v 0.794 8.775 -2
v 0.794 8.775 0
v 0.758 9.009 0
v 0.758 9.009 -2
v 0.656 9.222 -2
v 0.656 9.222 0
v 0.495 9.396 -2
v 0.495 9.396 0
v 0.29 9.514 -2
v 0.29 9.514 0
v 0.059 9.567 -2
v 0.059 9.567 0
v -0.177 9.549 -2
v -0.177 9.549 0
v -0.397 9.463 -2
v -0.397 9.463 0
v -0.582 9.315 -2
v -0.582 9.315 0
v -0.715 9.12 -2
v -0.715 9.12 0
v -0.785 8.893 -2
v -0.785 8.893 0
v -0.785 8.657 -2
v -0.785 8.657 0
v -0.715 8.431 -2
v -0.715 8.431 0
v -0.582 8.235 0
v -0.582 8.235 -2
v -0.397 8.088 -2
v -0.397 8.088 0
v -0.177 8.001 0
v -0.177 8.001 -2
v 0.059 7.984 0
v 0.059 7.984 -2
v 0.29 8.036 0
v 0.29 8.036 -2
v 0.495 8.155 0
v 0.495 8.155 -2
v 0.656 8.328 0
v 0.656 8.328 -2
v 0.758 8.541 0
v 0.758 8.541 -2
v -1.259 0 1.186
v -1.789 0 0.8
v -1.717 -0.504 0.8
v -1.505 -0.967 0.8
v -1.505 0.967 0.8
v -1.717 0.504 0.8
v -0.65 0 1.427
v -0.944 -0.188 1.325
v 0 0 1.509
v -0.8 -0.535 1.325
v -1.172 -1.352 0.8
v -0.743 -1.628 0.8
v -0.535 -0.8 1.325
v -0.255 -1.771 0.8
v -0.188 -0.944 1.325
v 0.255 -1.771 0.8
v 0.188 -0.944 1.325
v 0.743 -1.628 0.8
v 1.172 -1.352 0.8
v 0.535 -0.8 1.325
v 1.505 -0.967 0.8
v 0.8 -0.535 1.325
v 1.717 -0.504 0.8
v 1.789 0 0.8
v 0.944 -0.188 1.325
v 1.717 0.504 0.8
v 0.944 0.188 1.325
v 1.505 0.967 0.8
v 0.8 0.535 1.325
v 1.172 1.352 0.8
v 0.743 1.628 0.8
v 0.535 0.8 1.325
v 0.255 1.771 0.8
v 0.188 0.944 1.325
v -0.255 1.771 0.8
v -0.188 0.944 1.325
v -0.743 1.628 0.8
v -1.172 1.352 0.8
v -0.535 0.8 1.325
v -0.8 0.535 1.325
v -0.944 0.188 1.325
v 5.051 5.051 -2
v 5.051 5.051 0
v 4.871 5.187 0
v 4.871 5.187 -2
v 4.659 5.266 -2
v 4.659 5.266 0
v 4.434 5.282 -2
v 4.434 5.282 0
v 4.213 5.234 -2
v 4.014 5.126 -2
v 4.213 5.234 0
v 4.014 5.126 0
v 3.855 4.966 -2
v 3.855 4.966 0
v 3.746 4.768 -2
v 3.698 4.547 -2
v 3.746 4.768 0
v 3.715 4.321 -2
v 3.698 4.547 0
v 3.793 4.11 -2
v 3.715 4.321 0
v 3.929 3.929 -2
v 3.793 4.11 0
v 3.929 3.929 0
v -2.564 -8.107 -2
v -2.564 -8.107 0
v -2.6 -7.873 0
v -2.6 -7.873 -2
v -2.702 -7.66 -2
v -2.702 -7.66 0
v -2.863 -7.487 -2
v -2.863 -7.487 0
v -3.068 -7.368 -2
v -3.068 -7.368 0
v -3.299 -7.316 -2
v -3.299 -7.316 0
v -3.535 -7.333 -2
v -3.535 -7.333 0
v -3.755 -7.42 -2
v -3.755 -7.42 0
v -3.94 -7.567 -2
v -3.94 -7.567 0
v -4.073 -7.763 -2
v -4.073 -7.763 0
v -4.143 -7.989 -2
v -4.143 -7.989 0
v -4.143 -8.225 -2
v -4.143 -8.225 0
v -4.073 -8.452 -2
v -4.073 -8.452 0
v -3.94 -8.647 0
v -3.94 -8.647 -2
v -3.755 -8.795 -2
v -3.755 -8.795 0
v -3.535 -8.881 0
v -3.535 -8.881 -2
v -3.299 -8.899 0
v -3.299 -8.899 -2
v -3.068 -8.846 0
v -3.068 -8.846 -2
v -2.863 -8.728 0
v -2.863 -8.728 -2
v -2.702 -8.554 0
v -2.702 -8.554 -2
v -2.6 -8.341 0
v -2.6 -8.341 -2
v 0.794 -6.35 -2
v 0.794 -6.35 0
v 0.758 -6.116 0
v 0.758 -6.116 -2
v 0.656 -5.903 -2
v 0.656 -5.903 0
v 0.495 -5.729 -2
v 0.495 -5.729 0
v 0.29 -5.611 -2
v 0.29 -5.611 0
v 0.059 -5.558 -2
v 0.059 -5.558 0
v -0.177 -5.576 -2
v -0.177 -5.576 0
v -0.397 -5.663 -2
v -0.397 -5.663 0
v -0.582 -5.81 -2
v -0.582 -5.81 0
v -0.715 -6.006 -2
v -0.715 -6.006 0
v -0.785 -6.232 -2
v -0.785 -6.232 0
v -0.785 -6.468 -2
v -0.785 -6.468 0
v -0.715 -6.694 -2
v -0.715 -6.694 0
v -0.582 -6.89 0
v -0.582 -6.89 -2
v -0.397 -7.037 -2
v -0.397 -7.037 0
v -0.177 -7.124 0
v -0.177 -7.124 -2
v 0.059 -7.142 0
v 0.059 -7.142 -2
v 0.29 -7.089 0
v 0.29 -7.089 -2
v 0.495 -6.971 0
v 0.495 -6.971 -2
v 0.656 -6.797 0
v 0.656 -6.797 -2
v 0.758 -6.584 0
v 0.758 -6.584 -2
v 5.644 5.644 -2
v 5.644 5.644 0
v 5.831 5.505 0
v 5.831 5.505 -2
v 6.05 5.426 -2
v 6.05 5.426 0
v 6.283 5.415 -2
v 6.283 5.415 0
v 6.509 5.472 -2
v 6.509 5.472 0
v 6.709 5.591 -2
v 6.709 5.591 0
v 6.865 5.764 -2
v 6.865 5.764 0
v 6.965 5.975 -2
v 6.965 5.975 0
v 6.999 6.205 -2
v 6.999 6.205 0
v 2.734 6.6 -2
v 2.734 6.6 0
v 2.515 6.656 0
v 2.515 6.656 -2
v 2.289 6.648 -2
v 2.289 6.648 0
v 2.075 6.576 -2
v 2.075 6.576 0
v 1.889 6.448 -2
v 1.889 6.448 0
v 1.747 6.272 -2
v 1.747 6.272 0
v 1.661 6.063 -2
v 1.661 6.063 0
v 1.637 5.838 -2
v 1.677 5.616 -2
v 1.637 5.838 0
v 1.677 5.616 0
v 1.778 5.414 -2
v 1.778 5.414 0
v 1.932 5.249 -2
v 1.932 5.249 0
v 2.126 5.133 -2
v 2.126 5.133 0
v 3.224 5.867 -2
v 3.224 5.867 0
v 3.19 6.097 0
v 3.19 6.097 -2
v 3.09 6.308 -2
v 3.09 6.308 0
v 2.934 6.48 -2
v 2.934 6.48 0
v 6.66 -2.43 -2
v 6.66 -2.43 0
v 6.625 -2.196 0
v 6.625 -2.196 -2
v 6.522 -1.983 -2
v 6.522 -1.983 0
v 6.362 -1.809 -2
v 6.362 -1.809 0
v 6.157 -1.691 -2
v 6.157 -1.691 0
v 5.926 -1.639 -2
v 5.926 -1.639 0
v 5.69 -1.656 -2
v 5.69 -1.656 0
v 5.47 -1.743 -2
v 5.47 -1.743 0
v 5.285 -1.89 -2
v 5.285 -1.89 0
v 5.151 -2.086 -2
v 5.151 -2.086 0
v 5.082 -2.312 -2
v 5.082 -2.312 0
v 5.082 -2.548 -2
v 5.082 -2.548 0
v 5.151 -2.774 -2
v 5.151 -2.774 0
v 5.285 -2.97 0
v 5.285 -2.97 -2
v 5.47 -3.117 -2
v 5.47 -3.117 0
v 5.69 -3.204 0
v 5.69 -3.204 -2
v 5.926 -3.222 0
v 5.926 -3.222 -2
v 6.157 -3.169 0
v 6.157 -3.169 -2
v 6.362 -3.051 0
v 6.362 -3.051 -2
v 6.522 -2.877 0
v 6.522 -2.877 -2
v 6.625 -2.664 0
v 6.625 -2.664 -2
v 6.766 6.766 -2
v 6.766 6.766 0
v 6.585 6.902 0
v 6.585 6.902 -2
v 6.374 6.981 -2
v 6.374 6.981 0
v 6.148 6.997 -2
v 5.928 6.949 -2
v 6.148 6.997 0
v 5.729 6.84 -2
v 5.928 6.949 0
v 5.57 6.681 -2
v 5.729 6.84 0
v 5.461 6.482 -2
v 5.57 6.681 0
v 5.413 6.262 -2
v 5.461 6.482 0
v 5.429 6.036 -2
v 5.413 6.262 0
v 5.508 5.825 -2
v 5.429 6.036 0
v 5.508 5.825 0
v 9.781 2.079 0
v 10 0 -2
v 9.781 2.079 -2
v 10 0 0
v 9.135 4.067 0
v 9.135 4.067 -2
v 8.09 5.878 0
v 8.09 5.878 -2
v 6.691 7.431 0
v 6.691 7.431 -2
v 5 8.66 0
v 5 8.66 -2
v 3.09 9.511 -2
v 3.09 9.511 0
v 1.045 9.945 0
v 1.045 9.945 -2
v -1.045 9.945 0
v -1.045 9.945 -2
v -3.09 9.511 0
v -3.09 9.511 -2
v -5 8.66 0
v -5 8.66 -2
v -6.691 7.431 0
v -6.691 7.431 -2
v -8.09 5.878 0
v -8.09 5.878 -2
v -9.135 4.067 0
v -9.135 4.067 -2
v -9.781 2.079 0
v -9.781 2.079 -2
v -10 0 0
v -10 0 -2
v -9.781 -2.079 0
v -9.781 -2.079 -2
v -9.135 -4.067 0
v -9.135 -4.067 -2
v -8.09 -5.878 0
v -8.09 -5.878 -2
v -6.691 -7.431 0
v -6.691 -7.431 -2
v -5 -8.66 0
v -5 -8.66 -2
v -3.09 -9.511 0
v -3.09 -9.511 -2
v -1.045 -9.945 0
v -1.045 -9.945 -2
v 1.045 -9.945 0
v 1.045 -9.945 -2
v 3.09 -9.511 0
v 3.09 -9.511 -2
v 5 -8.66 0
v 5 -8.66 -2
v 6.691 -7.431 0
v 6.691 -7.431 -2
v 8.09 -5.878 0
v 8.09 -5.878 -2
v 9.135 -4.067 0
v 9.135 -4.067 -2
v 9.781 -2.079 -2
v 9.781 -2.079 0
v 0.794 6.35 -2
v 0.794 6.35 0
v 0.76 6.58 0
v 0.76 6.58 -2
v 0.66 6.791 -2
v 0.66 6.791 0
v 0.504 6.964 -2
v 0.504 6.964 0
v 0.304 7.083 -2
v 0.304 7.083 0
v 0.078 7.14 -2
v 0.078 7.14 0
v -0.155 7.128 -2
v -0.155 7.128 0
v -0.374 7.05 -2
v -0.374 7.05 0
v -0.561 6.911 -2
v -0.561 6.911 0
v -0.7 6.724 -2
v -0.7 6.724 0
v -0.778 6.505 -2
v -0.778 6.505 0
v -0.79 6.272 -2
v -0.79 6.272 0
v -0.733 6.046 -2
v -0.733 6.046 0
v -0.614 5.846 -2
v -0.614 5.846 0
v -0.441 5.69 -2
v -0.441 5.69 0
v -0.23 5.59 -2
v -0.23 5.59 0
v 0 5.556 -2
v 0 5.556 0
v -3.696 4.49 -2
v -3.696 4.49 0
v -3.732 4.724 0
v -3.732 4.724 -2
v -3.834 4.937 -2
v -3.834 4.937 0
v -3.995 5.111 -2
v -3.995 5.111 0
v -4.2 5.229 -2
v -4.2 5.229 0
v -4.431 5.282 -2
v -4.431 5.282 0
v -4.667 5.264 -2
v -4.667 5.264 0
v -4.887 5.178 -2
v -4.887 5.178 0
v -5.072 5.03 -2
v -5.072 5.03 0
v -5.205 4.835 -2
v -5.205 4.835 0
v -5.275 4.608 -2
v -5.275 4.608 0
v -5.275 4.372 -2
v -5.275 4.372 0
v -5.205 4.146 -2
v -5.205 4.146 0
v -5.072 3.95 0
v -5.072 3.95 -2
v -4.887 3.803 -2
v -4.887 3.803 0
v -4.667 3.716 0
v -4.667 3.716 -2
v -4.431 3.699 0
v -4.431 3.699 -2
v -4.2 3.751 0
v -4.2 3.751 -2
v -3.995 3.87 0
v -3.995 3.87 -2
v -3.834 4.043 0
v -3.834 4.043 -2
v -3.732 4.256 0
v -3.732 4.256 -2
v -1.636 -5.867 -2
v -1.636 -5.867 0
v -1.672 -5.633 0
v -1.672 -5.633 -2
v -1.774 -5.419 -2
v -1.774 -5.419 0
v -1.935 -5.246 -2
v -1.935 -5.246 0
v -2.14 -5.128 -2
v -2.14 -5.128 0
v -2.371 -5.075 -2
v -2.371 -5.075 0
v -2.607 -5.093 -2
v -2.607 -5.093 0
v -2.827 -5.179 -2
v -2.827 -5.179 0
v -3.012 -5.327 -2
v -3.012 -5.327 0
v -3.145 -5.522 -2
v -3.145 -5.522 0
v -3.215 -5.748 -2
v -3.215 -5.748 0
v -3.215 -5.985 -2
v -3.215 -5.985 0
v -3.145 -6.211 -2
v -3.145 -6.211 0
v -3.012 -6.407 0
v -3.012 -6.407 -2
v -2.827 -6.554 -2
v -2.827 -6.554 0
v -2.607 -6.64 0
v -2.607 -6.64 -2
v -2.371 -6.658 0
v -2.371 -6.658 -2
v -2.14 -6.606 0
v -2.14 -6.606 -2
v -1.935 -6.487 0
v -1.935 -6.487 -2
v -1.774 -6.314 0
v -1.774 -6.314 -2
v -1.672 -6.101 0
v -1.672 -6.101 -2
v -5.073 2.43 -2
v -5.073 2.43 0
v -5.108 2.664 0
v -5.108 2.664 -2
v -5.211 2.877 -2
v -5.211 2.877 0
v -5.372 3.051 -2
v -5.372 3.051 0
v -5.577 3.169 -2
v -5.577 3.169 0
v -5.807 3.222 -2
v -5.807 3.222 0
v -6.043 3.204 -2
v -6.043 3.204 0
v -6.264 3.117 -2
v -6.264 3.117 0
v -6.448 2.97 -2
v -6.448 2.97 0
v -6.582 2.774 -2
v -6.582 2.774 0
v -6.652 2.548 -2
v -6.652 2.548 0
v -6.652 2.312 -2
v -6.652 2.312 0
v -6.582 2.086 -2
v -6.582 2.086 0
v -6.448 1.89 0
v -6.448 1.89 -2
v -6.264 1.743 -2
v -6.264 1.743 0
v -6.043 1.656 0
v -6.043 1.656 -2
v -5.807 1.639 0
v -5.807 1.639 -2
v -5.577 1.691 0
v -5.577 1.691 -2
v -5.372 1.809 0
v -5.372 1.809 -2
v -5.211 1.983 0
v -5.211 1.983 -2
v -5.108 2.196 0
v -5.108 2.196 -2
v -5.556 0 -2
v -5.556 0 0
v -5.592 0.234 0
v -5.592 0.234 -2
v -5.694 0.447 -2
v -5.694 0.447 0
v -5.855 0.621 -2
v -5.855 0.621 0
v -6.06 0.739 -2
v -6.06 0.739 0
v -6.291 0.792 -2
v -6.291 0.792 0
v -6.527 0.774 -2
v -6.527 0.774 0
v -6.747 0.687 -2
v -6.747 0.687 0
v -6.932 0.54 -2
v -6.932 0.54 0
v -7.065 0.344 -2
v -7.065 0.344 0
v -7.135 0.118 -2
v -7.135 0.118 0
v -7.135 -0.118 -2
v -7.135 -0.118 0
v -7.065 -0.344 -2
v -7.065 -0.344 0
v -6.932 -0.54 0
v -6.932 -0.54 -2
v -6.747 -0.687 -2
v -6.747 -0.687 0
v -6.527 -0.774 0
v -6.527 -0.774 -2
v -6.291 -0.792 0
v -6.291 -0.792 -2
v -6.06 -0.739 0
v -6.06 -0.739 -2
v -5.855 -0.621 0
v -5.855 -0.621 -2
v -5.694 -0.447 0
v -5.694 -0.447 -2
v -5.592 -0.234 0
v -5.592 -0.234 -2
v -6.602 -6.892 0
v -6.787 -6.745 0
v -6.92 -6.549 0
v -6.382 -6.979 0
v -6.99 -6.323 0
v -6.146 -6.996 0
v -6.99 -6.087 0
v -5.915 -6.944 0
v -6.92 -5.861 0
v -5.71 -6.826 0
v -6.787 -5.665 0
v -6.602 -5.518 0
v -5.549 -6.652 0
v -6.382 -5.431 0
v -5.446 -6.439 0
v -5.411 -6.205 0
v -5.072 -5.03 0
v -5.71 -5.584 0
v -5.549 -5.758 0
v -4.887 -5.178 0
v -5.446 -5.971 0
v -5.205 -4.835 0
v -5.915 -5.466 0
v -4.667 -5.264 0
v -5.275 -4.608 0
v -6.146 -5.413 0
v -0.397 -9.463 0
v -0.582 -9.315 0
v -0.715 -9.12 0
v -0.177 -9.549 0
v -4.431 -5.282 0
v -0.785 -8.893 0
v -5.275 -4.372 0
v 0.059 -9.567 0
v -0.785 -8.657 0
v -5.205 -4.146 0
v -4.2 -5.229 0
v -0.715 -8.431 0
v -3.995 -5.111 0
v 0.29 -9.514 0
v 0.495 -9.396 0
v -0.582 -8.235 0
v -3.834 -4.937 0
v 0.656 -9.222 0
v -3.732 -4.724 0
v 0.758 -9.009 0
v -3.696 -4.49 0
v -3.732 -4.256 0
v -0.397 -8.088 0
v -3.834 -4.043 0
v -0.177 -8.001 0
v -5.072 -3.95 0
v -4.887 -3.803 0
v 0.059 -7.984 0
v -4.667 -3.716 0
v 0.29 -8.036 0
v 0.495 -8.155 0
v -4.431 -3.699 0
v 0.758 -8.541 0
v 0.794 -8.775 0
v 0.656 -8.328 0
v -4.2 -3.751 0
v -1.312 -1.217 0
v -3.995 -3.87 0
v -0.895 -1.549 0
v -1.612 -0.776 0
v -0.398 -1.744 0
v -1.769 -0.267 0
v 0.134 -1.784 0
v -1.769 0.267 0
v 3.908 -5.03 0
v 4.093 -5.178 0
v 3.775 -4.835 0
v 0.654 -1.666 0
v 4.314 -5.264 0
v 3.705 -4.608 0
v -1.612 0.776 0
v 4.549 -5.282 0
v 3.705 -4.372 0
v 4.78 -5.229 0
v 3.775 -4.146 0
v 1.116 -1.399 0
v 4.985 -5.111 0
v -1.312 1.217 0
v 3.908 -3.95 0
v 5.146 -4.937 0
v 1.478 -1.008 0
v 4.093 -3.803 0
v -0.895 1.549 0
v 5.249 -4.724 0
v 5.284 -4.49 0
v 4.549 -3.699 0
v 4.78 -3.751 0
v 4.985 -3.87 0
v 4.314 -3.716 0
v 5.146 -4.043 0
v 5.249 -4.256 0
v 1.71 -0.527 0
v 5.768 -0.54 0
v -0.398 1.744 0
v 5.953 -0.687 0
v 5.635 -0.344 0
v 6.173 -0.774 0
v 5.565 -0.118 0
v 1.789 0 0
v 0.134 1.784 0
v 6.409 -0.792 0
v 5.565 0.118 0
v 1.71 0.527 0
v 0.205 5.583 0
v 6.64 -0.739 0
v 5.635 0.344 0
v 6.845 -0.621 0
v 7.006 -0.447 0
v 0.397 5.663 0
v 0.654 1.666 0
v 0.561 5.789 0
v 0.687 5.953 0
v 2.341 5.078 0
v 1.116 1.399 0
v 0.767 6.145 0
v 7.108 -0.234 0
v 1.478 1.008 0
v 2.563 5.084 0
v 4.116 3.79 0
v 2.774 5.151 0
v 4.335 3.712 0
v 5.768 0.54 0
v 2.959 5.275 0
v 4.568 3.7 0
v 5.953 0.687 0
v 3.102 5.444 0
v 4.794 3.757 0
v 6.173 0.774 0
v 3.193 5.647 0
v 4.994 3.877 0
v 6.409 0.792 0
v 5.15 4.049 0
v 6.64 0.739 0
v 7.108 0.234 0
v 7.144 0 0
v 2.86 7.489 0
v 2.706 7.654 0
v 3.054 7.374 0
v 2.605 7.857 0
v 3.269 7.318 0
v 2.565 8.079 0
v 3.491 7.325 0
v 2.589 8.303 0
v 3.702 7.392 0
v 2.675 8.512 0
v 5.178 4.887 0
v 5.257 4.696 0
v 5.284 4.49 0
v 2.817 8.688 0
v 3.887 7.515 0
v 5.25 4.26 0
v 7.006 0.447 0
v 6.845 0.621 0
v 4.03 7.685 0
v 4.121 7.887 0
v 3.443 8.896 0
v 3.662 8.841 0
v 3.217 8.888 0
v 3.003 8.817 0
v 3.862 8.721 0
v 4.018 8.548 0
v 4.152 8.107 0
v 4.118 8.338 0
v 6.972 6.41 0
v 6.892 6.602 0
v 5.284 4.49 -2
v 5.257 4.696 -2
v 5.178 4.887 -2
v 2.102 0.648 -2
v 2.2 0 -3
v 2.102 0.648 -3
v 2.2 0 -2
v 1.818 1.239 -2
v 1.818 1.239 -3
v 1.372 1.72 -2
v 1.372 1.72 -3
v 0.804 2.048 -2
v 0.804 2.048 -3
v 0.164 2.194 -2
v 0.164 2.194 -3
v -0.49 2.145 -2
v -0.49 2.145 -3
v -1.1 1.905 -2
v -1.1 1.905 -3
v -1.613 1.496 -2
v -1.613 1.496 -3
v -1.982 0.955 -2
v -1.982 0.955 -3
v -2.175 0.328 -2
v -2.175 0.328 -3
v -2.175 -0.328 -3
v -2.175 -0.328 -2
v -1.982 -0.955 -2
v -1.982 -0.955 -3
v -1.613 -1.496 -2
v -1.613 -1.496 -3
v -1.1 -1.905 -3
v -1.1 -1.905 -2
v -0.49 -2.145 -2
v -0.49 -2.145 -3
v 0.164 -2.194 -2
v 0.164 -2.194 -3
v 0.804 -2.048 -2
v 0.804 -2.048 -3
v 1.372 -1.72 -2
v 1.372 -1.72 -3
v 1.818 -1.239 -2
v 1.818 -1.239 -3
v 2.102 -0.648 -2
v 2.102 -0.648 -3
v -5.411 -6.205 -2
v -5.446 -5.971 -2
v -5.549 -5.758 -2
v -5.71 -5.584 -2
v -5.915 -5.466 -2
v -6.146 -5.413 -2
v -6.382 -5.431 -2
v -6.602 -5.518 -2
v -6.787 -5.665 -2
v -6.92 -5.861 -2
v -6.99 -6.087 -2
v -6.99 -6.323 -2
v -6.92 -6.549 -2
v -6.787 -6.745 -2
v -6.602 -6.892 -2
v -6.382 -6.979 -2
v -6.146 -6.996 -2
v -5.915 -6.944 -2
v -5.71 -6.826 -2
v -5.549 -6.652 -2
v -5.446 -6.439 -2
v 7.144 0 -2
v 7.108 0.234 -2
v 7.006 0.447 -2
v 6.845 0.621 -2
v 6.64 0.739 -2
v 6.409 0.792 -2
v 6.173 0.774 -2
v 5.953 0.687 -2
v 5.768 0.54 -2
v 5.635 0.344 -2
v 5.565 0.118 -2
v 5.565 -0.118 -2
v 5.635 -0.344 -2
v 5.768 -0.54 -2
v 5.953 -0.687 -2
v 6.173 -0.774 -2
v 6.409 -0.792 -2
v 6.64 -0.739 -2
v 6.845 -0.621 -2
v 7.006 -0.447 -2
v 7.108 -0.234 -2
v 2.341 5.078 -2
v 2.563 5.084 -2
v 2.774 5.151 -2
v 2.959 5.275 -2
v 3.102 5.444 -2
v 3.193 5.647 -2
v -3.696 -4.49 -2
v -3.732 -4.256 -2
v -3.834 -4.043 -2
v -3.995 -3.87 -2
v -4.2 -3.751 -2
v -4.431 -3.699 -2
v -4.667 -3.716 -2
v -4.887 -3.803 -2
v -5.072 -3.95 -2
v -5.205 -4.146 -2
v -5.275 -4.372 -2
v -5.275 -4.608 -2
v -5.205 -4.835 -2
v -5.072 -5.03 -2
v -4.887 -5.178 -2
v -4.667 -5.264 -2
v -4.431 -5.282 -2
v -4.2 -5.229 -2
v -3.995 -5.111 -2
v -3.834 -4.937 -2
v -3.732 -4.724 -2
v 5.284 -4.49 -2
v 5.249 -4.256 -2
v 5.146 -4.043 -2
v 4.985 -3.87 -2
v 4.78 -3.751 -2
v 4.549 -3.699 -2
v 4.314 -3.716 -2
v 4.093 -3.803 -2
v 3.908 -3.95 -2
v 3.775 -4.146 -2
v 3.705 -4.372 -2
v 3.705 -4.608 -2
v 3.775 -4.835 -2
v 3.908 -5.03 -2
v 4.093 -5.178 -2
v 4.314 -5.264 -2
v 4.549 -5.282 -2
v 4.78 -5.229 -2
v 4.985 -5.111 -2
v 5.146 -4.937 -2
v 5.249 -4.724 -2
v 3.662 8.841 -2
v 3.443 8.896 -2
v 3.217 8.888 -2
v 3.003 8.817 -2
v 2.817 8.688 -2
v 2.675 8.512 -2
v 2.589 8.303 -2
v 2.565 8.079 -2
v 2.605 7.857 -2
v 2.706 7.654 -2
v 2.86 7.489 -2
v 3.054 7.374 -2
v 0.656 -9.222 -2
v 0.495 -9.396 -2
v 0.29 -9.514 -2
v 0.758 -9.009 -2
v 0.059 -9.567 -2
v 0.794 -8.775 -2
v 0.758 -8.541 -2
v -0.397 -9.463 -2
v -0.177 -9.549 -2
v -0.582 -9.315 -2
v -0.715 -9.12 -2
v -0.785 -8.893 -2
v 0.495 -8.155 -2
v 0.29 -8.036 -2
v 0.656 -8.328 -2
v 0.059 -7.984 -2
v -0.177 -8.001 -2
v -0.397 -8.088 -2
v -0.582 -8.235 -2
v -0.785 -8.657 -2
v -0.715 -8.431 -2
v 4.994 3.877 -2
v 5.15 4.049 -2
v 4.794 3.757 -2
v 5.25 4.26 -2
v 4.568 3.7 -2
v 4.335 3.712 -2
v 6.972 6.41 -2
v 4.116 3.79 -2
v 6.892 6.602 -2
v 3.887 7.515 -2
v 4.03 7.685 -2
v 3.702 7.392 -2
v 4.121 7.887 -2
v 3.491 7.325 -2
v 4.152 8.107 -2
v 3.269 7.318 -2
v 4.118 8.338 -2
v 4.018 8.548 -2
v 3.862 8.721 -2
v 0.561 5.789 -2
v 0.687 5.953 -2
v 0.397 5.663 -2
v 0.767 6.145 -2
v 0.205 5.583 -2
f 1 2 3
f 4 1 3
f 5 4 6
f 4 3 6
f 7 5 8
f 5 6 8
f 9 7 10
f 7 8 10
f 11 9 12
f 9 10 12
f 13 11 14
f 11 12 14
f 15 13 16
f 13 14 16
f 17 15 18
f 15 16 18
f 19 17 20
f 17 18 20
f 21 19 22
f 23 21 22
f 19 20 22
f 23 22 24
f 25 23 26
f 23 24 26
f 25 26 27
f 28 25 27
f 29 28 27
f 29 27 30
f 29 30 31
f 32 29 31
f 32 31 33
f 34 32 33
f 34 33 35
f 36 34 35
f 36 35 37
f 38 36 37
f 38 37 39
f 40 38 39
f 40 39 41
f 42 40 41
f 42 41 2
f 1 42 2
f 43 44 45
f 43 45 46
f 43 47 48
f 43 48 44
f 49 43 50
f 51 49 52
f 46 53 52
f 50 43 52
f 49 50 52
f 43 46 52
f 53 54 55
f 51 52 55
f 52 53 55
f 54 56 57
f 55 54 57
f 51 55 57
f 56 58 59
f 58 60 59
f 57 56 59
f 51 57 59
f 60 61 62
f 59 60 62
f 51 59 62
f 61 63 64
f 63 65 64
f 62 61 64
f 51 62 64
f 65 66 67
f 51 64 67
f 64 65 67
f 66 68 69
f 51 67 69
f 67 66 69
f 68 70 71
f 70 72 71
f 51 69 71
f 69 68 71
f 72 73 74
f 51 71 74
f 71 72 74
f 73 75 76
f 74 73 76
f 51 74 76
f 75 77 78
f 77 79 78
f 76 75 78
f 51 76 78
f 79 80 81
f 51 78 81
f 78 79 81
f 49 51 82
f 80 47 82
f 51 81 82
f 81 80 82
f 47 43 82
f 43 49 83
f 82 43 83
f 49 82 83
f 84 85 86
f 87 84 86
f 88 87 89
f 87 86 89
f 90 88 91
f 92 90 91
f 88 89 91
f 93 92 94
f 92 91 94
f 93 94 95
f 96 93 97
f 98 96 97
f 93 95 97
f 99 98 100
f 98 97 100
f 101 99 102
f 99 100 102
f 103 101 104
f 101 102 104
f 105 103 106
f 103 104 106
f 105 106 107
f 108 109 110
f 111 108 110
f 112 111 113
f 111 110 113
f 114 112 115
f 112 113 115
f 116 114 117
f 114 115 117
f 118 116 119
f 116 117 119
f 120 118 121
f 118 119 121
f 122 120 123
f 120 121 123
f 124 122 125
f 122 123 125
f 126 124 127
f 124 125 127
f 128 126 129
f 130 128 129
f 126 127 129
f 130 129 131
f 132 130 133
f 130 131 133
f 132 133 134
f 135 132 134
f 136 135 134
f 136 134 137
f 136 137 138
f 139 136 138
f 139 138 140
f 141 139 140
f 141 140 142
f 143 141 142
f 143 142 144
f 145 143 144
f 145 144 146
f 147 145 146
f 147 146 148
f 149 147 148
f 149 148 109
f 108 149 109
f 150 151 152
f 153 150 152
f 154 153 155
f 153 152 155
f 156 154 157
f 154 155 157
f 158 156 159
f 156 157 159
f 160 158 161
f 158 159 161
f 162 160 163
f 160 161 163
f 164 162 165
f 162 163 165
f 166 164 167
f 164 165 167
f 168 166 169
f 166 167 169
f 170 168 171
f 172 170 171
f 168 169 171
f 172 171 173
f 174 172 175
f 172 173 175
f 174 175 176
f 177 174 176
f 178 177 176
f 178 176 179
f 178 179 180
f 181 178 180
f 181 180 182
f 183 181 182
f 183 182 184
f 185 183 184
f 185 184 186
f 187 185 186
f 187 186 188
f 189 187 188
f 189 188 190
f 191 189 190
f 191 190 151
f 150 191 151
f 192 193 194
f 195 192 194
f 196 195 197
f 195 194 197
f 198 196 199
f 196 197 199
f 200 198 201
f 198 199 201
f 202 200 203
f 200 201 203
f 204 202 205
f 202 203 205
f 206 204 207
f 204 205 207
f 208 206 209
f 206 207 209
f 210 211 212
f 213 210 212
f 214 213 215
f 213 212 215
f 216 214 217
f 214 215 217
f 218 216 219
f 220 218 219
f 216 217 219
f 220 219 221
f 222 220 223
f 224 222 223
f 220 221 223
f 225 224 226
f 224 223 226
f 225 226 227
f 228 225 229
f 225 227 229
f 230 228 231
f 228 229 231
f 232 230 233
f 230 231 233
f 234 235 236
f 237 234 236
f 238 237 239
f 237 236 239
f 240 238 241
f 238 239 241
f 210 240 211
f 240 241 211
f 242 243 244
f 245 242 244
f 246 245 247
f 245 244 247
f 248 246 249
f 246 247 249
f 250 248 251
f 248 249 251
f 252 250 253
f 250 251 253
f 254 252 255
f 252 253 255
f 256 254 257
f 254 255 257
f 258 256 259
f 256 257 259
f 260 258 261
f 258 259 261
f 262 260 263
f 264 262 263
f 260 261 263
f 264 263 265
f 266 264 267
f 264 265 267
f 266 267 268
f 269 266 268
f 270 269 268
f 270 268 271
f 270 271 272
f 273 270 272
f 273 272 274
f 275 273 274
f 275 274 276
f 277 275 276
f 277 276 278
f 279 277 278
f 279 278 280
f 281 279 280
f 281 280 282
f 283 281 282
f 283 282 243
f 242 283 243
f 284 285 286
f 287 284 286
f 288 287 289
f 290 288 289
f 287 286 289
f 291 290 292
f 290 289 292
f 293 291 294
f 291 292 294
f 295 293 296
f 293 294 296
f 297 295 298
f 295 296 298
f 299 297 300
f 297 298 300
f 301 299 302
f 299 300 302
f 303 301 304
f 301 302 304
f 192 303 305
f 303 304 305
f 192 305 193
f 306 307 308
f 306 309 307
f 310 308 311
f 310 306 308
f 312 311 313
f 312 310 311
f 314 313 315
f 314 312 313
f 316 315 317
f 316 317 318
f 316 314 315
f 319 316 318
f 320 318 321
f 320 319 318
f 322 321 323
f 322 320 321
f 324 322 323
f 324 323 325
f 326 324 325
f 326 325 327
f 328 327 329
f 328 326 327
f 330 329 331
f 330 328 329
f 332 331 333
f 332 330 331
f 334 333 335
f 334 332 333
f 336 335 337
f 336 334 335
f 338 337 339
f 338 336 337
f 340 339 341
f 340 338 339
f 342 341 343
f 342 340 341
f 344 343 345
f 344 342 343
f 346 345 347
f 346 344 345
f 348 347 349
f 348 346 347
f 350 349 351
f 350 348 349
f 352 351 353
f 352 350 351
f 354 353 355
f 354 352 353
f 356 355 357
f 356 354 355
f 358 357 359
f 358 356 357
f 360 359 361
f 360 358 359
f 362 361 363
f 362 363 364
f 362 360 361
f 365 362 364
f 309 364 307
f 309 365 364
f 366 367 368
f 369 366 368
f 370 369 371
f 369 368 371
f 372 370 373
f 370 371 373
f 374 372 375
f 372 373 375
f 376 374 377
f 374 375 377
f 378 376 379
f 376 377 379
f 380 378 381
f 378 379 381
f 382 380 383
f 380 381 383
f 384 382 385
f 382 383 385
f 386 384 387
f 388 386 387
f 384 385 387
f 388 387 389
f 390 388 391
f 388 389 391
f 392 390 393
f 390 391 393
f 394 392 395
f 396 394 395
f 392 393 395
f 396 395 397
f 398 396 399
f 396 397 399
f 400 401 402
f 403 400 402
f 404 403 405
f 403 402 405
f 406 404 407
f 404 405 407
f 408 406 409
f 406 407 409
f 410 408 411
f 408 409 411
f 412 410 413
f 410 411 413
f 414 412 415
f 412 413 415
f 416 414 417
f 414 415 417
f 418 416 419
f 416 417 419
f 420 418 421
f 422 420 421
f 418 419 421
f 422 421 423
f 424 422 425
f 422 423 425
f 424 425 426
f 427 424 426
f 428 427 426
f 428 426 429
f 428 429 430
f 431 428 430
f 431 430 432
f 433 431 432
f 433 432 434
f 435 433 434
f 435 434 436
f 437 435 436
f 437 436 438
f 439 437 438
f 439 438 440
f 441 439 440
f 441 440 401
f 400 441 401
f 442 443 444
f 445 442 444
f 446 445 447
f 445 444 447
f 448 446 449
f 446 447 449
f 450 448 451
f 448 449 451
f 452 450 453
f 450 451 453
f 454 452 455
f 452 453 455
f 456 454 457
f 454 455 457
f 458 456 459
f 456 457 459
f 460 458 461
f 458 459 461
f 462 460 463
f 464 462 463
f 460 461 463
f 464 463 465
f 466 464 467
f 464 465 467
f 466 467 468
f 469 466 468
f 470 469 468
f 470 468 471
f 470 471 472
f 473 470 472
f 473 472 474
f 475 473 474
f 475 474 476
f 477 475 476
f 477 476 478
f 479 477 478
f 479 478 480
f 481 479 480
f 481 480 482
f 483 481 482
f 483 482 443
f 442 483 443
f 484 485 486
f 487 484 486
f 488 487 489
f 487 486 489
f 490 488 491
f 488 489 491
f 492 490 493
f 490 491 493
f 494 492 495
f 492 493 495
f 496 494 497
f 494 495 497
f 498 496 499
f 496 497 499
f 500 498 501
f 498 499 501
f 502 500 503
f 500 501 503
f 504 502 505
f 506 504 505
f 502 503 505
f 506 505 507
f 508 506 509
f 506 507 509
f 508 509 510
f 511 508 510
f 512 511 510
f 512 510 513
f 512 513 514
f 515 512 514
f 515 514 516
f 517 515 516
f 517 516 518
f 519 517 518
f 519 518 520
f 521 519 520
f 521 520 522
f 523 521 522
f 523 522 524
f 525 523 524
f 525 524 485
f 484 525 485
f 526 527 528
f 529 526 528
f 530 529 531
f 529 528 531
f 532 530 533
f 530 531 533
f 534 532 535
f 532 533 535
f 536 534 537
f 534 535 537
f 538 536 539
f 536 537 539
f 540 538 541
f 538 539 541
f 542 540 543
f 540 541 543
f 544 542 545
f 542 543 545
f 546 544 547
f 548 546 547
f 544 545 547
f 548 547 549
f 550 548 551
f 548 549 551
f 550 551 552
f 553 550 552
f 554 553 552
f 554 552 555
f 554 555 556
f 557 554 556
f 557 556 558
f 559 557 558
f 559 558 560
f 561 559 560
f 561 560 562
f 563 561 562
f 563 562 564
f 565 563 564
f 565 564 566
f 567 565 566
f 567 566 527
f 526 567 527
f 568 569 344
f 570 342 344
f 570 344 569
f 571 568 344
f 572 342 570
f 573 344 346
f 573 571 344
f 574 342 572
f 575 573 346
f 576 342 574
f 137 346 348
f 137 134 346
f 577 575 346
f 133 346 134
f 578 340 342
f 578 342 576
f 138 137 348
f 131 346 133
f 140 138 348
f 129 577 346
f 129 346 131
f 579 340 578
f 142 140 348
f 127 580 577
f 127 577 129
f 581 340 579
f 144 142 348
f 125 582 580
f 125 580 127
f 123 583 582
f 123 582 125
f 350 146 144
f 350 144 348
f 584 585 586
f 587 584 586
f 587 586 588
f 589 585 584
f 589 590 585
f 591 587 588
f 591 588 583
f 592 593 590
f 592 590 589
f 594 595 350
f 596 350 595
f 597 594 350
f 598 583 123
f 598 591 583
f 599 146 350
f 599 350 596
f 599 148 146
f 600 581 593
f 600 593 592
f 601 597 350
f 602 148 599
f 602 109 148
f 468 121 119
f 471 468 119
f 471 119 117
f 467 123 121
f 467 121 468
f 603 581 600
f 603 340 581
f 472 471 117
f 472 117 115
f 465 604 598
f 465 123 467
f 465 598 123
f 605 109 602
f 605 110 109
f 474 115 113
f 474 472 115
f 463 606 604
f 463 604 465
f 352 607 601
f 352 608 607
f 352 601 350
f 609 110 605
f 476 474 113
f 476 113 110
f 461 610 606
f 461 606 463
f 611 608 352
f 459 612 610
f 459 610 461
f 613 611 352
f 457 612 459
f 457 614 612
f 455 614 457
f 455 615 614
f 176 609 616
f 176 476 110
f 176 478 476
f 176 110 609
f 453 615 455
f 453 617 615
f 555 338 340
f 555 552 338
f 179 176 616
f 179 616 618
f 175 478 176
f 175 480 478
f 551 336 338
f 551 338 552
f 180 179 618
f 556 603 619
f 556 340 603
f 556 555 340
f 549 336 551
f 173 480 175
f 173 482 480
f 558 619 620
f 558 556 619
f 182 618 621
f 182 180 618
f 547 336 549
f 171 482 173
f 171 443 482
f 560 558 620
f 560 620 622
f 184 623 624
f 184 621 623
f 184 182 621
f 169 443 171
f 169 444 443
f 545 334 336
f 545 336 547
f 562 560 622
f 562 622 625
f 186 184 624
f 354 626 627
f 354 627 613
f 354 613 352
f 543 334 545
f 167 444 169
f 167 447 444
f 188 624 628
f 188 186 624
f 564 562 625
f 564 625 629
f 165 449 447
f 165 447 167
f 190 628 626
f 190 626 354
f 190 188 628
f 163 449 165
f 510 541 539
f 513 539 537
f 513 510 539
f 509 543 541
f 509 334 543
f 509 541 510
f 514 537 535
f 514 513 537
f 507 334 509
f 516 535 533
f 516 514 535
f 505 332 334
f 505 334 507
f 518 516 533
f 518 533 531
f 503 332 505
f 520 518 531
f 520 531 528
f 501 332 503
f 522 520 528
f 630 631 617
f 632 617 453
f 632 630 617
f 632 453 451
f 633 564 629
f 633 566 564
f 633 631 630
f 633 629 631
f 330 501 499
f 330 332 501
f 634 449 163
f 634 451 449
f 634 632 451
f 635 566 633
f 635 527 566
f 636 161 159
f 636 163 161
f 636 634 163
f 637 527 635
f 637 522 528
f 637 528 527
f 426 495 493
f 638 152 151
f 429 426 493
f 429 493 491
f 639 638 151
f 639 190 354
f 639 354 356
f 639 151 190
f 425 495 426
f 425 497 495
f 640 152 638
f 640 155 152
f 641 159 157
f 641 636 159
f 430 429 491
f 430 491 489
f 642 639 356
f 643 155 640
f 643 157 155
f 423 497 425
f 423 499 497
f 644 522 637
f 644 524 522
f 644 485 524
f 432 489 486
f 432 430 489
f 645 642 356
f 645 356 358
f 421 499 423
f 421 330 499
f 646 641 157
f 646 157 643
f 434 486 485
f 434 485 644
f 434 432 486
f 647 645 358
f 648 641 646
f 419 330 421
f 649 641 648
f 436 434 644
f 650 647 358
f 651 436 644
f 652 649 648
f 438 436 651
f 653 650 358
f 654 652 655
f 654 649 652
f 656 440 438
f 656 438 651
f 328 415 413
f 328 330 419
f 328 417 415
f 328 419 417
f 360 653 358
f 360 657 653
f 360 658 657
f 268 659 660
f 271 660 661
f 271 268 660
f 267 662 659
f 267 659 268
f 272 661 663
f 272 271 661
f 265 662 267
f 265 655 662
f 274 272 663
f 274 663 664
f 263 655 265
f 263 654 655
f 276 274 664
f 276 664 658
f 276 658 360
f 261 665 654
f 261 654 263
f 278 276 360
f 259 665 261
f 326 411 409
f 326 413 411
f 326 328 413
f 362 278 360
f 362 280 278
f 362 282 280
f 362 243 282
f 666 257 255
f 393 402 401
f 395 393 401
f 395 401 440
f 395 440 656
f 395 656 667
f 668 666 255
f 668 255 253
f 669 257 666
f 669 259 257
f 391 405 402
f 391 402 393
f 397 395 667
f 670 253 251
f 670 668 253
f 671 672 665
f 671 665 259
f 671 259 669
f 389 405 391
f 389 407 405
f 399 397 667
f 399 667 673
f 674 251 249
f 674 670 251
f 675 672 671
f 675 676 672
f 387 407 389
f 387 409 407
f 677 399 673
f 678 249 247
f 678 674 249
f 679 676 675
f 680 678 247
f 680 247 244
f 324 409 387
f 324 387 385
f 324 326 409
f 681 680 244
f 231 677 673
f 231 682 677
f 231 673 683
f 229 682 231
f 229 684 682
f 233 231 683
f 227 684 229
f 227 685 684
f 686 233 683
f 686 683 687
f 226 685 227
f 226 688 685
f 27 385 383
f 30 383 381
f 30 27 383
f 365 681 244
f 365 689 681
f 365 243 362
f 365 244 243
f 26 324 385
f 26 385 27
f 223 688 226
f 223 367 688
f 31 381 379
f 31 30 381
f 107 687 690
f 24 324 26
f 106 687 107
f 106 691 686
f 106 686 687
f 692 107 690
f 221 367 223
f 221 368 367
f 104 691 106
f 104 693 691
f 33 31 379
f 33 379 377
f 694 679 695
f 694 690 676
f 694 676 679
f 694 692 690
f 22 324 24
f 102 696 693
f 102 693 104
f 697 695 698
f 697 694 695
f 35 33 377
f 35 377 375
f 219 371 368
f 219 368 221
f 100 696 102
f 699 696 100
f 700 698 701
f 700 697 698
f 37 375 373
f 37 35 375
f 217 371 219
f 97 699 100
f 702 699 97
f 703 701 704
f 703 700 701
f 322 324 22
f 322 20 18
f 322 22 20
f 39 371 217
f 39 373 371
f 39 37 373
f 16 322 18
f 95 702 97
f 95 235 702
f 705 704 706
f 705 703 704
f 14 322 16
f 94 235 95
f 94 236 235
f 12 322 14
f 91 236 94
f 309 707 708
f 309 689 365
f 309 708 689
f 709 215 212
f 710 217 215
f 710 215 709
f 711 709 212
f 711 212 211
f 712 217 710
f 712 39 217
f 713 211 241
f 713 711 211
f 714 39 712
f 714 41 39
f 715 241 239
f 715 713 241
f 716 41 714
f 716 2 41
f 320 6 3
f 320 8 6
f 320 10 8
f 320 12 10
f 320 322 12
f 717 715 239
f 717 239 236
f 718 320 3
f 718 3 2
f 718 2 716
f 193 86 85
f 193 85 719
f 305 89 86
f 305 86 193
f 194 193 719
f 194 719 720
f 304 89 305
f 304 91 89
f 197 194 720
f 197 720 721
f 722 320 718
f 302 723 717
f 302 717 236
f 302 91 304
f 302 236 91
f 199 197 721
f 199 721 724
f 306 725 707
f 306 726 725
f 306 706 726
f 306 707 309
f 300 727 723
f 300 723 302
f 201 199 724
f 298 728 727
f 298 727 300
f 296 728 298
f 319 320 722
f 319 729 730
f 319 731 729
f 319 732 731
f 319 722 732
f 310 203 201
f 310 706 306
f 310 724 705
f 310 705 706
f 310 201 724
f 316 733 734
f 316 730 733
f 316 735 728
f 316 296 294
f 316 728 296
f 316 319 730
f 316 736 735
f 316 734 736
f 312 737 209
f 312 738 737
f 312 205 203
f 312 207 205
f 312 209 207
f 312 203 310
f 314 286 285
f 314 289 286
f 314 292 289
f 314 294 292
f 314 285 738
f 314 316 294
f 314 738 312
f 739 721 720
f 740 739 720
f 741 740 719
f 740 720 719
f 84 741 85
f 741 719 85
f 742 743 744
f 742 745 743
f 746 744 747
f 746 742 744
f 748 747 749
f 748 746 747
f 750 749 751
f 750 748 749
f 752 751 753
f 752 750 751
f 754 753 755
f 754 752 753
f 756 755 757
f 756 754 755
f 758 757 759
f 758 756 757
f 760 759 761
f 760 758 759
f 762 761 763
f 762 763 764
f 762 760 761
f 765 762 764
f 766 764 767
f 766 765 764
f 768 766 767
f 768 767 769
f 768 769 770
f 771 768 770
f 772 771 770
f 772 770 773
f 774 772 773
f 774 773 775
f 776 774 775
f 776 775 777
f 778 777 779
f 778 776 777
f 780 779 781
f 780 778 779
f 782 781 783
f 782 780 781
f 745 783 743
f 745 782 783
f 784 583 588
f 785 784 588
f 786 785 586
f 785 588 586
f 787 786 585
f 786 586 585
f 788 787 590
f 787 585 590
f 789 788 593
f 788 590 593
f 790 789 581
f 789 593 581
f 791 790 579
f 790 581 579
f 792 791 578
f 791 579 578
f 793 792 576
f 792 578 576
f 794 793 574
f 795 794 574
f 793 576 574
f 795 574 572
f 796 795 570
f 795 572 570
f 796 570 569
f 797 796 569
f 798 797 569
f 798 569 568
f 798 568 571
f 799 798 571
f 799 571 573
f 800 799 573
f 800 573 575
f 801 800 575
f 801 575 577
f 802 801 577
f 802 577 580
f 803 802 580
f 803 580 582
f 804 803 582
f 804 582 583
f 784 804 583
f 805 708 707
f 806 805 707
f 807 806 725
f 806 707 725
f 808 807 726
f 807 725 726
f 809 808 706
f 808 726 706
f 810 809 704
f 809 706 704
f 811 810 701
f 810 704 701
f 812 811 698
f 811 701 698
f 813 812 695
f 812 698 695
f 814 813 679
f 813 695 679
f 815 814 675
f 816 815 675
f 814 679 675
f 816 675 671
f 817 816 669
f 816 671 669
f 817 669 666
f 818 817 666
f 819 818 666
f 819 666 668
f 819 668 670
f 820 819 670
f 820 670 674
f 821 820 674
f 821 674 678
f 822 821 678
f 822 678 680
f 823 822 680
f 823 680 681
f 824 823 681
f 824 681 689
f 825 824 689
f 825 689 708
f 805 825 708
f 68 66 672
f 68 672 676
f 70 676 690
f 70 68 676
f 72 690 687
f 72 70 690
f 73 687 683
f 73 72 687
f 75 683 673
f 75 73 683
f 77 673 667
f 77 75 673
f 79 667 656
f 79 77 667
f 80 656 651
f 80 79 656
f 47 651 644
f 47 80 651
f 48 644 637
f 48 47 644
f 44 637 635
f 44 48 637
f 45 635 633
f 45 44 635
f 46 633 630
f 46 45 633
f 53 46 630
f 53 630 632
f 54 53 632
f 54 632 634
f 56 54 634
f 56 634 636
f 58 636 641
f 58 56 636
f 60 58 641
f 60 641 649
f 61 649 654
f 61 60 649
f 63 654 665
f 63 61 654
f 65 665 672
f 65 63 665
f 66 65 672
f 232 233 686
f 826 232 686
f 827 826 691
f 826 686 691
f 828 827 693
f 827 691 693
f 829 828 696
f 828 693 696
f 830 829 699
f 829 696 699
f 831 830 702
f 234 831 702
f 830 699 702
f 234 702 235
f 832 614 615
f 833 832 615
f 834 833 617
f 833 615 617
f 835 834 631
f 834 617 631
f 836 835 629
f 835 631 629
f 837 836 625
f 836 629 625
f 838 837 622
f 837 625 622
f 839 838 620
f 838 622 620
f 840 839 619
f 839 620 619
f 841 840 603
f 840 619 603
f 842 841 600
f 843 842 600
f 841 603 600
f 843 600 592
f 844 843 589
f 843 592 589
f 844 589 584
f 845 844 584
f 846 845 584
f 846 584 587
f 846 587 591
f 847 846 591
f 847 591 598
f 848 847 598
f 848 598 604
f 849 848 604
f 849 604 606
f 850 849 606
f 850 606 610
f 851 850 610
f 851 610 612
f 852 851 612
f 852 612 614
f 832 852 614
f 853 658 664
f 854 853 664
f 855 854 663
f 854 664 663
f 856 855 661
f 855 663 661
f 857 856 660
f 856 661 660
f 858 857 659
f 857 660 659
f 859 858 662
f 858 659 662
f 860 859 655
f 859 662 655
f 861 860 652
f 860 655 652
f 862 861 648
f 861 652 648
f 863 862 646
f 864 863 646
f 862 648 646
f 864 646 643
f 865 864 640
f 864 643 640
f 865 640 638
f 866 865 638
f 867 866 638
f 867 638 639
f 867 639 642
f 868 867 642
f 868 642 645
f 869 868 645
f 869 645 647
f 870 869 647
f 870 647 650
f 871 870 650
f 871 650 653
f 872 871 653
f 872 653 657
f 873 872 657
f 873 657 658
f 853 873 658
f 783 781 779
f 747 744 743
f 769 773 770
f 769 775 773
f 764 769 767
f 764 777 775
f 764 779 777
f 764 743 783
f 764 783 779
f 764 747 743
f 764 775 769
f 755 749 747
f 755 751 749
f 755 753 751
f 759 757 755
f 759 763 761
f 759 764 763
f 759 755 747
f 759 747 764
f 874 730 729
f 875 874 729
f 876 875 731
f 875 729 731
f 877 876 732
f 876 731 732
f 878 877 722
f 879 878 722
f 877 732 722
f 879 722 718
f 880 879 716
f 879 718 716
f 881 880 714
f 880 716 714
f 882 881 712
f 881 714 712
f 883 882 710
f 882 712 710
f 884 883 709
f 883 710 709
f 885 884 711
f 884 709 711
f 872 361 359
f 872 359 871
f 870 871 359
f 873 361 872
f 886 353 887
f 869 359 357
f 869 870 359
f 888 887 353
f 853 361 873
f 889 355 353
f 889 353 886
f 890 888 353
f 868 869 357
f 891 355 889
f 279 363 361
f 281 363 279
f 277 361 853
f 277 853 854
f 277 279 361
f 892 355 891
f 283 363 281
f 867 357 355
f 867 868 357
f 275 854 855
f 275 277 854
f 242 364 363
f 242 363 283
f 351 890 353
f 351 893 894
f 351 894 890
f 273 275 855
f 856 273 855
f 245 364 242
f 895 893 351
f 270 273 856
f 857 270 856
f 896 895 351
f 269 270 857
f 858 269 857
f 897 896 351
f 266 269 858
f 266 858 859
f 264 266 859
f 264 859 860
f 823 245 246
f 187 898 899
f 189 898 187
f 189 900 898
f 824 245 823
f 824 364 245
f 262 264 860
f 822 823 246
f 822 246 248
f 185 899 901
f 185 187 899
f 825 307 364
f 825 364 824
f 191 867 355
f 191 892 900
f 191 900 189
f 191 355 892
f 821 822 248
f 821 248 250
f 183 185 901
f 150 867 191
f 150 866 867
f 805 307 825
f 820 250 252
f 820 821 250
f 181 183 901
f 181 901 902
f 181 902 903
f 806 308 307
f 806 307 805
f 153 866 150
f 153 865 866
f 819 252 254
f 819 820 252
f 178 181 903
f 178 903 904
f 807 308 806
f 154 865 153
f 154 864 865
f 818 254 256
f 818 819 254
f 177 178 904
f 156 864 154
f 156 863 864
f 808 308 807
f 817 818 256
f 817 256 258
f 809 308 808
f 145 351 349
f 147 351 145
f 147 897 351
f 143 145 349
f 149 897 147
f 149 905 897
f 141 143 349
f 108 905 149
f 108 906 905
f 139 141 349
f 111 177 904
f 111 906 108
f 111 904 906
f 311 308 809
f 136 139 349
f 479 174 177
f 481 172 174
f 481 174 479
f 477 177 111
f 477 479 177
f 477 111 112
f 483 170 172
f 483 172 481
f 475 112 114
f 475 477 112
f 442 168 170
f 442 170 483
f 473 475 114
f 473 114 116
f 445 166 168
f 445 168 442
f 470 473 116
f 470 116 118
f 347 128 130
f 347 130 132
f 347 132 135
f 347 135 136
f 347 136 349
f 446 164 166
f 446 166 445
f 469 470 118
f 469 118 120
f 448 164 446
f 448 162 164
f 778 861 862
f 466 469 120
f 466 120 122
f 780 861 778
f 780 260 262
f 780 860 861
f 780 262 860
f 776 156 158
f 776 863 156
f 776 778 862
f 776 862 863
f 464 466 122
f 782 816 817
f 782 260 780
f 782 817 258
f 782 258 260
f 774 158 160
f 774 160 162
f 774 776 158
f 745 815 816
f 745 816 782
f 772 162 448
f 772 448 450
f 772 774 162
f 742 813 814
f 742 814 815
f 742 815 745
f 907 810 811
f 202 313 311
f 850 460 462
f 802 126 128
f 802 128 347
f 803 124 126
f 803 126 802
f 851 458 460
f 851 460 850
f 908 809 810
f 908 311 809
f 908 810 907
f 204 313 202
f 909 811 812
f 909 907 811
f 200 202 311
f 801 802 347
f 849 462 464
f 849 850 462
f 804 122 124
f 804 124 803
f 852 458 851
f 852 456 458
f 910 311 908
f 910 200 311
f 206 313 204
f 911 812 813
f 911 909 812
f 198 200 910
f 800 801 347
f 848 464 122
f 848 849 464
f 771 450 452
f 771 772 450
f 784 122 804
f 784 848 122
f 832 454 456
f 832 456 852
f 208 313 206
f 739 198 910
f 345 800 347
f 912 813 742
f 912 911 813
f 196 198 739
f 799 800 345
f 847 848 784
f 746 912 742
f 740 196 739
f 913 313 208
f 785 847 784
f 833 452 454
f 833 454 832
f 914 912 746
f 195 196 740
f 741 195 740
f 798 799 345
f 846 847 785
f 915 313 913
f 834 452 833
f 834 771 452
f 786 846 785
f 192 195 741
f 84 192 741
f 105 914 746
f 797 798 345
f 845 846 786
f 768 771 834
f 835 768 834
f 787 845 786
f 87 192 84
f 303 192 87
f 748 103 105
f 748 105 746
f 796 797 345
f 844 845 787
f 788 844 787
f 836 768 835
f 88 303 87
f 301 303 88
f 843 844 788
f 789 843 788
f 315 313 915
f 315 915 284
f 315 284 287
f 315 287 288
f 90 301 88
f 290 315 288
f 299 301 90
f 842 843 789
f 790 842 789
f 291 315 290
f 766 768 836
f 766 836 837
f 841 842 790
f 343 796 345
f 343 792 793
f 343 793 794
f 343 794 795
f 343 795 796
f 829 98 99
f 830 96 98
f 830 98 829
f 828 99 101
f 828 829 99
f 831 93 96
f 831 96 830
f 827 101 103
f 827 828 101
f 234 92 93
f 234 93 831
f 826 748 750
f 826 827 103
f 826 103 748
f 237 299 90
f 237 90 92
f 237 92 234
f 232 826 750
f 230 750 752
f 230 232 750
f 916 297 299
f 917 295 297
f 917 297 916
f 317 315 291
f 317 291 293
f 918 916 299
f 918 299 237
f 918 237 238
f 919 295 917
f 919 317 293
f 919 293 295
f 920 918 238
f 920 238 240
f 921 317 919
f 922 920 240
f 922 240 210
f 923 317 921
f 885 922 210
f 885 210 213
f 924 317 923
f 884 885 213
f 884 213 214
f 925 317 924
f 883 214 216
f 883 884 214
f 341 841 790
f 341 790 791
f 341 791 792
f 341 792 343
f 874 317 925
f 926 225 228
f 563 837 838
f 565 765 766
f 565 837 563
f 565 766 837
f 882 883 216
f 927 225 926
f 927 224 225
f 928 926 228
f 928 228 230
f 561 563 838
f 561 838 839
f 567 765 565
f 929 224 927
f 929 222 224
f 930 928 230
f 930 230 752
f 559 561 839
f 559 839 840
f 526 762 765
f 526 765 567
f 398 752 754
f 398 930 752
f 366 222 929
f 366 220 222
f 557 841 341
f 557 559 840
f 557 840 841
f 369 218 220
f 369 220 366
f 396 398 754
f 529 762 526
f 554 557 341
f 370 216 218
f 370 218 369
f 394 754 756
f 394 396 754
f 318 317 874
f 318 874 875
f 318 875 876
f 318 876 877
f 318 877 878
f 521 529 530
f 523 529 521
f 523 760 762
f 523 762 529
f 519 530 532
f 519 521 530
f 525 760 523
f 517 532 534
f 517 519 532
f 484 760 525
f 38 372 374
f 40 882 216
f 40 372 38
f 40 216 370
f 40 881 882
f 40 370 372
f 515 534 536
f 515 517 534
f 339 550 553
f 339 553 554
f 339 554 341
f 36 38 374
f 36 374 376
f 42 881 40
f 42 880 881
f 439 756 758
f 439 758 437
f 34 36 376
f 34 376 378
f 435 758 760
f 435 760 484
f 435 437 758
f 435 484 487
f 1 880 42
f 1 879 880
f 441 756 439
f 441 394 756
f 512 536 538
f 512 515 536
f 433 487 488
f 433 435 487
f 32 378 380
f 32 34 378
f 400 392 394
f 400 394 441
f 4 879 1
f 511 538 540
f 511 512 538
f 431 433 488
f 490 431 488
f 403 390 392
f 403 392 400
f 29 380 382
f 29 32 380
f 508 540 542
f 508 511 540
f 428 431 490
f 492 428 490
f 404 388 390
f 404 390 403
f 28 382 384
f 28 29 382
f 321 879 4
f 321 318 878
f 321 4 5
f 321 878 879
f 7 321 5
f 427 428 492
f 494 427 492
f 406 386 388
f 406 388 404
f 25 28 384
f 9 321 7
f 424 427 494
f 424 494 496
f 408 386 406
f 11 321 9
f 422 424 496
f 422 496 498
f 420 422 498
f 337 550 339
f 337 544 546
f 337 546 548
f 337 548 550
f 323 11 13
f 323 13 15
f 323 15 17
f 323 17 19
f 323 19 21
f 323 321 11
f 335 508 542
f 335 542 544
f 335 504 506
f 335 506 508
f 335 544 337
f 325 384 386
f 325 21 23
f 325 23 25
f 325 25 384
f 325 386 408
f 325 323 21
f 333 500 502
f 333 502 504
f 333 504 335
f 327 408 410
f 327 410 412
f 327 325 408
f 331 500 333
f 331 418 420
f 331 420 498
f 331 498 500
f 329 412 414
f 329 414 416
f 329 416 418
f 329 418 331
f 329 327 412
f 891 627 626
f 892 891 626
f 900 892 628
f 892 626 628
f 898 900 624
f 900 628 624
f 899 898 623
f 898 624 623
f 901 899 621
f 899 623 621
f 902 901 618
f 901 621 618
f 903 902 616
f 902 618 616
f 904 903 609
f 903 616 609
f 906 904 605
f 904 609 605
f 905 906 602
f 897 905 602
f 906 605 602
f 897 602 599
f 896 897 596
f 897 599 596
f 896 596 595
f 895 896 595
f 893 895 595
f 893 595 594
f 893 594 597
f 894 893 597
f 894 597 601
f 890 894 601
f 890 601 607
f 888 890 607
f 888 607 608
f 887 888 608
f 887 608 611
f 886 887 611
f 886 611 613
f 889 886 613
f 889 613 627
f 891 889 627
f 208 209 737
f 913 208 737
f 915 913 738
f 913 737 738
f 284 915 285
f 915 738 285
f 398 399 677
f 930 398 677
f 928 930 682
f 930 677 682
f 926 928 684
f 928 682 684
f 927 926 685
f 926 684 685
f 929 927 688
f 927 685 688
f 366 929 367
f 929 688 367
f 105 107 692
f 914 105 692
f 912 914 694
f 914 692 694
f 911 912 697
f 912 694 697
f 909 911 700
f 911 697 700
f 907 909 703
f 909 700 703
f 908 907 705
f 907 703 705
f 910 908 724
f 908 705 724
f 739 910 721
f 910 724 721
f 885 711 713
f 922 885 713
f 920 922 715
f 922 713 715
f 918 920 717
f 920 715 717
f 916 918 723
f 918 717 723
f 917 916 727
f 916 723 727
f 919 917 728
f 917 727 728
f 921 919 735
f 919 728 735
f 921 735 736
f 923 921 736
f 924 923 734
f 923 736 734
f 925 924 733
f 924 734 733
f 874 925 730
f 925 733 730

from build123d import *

# Parameters (mm, degrees)
F0_W     = 1.7891867319
F0_H     = 0.8
F2_R     = 0.79375
F3_DEPTH = 25.4


with BuildPart() as f1:
    # F0 (on Front) → F1 (revolve)
    with BuildSketch(Plane.XZ):
        with Locations((0.894593366, 0.4)):
            Rectangle(F0_W, F0_H)
        Polygon((1.7891867319, 0), (0, 0), (0, -3), (2.2, -3), (2.2, -2), (10, -2), (10, 0), align=None)
    revolve(axis=Axis((0, 0, -1.5), (0, 0, 1)))

    # F2 (on face) → F3 (cut)
    with BuildSketch(Plane.XY):
        with BuildLine():
            ThreePointArc((0.79375, 6.35), (-0.5612660076, 6.9112660076), (0, 5.55625))
            ThreePointArc((0, 5.55625), (0.5612660076, 5.7887339924), (0.79375, 6.35))
        make_face()
        with BuildLine():
            Line((2.4300397955, 5.8666350314), (2.1262848211, 5.1333056525))
            ThreePointArc((2.1262848211, 5.1333056525), (2.871023668, 5.2066560267), (3.2237897955, 5.8666350314))
            ThreePointArc((3.2237897955, 5.8666350314), (3.0900188003, 6.3076189039), (2.73379477, 6.5999644104))
            Line((2.73379477, 6.5999644104), (2.4300397955, 5.8666350314))
        make_face()
        with BuildLine():
            ThreePointArc((2.73379477, 6.5999644104), (1.6967104166, 6.1703900059), (2.1262848211, 5.1333056525))
            Line((2.1262848211, 5.1333056525), (2.4300397955, 5.8666350314))
            Line((2.4300397955, 5.8666350314), (2.73379477, 6.5999644104))
        make_face()
        with BuildLine():
            Line((4.4901280605, 4.4901280605), (3.928862053, 3.928862053))
            ThreePointArc((3.928862053, 3.928862053), (4.793883035, 3.7567986816), (5.2838780605, 4.4901280605))
            ThreePointArc((5.2838780605, 4.4901280605), (5.2234574395, 4.793883035), (5.0513940681, 5.0513940681))
            Line((5.0513940681, 5.0513940681), (4.4901280605, 4.4901280605))
        make_face()
        with BuildLine():
            ThreePointArc((5.0513940681, 5.0513940681), (3.928862053, 5.0513940681), (3.928862053, 3.928862053))
            Line((3.928862053, 3.928862053), (4.4901280605, 4.4901280605))
            Line((4.4901280605, 4.4901280605), (5.0513940681, 5.0513940681))
        make_face()
        with BuildLine():
            ThreePointArc((3.6618567991, 8.8405043479), (2.6247724457, 8.4109299434), (3.0543468502, 7.37384559))
            Line((3.0543468502, 7.37384559), (3.6618567991, 8.8405043479))
        make_face()
        with BuildLine():
            Line((3.6618567991, 8.8405043479), (3.0543468502, 7.37384559))
            ThreePointArc((3.0543468502, 7.37384559), (3.7990856971, 7.4471959642), (4.1518518247, 8.107174969))
            ThreePointArc((4.1518518247, 8.107174969), (4.0180808294, 8.5481588414), (3.6618567991, 8.8405043479))
        make_face()
        with BuildLine():
            ThreePointArc((6.7662290954, 6.7662290954), (5.6436970802, 6.7662290954), (5.6436970802, 5.6436970802))
            Line((5.6436970802, 5.6436970802), (6.7662290954, 6.7662290954))
        make_face()
        with BuildLine():
            Line((6.7662290954, 6.7662290954), (5.6436970802, 5.6436970802))
            ThreePointArc((5.6436970802, 5.6436970802), (6.5087180622, 5.4716337089), (6.9987130878, 6.2049630878))
            ThreePointArc((6.9987130878, 6.2049630878), (6.9382924667, 6.5087180622), (6.7662290954, 6.7662290954))
        make_face()
        with Locations((-6.35, 0)):
            Circle(F2_R)
        with Locations((-5.8666350314, 2.4300397955)):
            Circle(F2_R)
        with Locations((-4.4901280605, 4.4901280605)):
            Circle(F2_R)
        with Locations((0, -6.35)):
            Circle(F2_R)
        with Locations((-2.4300397955, -5.8666350314)):
            Circle(F2_R)
        with Locations((-4.4901280605, -4.4901280605)):
            Circle(F2_R)
        with Locations((6.35, 0)):
            Circle(F2_R)
        with Locations((5.8666350314, -2.4300397955)):
            Circle(F2_R)
        with Locations((4.4901280605, -4.4901280605)):
            Circle(F2_R)
        with Locations((0, 8.7751429528)):
            Circle(F2_R)
        with Locations((0, -8.7751429528)):
            Circle(F2_R)
        with Locations((-3.3581018247, -8.107174969)):
            Circle(F2_R)
        with Locations((-6.2049630878, -6.2049630878)):
            Circle(F2_R)
    extrude(amount=-F3_DEPTH, mode=Mode.SUBTRACT)

    # F4 (on Front) → F5 (revolve)
    with BuildSketch(Plane.XZ):
        with BuildLine():
            Line((-1.7891867319, 0.8), (0, 0.8))
            Line((0, 0.8), (0, 1.5092346721))
            ThreePointArc((0, 1.5092346721), (-0.9623153046, 1.3254595112), (-1.7891867319, 0.8))
        make_face()
    revolve(axis=Axis((0, 0, 1.1546173361), (0, 0, 1)))


solid = f1.part
